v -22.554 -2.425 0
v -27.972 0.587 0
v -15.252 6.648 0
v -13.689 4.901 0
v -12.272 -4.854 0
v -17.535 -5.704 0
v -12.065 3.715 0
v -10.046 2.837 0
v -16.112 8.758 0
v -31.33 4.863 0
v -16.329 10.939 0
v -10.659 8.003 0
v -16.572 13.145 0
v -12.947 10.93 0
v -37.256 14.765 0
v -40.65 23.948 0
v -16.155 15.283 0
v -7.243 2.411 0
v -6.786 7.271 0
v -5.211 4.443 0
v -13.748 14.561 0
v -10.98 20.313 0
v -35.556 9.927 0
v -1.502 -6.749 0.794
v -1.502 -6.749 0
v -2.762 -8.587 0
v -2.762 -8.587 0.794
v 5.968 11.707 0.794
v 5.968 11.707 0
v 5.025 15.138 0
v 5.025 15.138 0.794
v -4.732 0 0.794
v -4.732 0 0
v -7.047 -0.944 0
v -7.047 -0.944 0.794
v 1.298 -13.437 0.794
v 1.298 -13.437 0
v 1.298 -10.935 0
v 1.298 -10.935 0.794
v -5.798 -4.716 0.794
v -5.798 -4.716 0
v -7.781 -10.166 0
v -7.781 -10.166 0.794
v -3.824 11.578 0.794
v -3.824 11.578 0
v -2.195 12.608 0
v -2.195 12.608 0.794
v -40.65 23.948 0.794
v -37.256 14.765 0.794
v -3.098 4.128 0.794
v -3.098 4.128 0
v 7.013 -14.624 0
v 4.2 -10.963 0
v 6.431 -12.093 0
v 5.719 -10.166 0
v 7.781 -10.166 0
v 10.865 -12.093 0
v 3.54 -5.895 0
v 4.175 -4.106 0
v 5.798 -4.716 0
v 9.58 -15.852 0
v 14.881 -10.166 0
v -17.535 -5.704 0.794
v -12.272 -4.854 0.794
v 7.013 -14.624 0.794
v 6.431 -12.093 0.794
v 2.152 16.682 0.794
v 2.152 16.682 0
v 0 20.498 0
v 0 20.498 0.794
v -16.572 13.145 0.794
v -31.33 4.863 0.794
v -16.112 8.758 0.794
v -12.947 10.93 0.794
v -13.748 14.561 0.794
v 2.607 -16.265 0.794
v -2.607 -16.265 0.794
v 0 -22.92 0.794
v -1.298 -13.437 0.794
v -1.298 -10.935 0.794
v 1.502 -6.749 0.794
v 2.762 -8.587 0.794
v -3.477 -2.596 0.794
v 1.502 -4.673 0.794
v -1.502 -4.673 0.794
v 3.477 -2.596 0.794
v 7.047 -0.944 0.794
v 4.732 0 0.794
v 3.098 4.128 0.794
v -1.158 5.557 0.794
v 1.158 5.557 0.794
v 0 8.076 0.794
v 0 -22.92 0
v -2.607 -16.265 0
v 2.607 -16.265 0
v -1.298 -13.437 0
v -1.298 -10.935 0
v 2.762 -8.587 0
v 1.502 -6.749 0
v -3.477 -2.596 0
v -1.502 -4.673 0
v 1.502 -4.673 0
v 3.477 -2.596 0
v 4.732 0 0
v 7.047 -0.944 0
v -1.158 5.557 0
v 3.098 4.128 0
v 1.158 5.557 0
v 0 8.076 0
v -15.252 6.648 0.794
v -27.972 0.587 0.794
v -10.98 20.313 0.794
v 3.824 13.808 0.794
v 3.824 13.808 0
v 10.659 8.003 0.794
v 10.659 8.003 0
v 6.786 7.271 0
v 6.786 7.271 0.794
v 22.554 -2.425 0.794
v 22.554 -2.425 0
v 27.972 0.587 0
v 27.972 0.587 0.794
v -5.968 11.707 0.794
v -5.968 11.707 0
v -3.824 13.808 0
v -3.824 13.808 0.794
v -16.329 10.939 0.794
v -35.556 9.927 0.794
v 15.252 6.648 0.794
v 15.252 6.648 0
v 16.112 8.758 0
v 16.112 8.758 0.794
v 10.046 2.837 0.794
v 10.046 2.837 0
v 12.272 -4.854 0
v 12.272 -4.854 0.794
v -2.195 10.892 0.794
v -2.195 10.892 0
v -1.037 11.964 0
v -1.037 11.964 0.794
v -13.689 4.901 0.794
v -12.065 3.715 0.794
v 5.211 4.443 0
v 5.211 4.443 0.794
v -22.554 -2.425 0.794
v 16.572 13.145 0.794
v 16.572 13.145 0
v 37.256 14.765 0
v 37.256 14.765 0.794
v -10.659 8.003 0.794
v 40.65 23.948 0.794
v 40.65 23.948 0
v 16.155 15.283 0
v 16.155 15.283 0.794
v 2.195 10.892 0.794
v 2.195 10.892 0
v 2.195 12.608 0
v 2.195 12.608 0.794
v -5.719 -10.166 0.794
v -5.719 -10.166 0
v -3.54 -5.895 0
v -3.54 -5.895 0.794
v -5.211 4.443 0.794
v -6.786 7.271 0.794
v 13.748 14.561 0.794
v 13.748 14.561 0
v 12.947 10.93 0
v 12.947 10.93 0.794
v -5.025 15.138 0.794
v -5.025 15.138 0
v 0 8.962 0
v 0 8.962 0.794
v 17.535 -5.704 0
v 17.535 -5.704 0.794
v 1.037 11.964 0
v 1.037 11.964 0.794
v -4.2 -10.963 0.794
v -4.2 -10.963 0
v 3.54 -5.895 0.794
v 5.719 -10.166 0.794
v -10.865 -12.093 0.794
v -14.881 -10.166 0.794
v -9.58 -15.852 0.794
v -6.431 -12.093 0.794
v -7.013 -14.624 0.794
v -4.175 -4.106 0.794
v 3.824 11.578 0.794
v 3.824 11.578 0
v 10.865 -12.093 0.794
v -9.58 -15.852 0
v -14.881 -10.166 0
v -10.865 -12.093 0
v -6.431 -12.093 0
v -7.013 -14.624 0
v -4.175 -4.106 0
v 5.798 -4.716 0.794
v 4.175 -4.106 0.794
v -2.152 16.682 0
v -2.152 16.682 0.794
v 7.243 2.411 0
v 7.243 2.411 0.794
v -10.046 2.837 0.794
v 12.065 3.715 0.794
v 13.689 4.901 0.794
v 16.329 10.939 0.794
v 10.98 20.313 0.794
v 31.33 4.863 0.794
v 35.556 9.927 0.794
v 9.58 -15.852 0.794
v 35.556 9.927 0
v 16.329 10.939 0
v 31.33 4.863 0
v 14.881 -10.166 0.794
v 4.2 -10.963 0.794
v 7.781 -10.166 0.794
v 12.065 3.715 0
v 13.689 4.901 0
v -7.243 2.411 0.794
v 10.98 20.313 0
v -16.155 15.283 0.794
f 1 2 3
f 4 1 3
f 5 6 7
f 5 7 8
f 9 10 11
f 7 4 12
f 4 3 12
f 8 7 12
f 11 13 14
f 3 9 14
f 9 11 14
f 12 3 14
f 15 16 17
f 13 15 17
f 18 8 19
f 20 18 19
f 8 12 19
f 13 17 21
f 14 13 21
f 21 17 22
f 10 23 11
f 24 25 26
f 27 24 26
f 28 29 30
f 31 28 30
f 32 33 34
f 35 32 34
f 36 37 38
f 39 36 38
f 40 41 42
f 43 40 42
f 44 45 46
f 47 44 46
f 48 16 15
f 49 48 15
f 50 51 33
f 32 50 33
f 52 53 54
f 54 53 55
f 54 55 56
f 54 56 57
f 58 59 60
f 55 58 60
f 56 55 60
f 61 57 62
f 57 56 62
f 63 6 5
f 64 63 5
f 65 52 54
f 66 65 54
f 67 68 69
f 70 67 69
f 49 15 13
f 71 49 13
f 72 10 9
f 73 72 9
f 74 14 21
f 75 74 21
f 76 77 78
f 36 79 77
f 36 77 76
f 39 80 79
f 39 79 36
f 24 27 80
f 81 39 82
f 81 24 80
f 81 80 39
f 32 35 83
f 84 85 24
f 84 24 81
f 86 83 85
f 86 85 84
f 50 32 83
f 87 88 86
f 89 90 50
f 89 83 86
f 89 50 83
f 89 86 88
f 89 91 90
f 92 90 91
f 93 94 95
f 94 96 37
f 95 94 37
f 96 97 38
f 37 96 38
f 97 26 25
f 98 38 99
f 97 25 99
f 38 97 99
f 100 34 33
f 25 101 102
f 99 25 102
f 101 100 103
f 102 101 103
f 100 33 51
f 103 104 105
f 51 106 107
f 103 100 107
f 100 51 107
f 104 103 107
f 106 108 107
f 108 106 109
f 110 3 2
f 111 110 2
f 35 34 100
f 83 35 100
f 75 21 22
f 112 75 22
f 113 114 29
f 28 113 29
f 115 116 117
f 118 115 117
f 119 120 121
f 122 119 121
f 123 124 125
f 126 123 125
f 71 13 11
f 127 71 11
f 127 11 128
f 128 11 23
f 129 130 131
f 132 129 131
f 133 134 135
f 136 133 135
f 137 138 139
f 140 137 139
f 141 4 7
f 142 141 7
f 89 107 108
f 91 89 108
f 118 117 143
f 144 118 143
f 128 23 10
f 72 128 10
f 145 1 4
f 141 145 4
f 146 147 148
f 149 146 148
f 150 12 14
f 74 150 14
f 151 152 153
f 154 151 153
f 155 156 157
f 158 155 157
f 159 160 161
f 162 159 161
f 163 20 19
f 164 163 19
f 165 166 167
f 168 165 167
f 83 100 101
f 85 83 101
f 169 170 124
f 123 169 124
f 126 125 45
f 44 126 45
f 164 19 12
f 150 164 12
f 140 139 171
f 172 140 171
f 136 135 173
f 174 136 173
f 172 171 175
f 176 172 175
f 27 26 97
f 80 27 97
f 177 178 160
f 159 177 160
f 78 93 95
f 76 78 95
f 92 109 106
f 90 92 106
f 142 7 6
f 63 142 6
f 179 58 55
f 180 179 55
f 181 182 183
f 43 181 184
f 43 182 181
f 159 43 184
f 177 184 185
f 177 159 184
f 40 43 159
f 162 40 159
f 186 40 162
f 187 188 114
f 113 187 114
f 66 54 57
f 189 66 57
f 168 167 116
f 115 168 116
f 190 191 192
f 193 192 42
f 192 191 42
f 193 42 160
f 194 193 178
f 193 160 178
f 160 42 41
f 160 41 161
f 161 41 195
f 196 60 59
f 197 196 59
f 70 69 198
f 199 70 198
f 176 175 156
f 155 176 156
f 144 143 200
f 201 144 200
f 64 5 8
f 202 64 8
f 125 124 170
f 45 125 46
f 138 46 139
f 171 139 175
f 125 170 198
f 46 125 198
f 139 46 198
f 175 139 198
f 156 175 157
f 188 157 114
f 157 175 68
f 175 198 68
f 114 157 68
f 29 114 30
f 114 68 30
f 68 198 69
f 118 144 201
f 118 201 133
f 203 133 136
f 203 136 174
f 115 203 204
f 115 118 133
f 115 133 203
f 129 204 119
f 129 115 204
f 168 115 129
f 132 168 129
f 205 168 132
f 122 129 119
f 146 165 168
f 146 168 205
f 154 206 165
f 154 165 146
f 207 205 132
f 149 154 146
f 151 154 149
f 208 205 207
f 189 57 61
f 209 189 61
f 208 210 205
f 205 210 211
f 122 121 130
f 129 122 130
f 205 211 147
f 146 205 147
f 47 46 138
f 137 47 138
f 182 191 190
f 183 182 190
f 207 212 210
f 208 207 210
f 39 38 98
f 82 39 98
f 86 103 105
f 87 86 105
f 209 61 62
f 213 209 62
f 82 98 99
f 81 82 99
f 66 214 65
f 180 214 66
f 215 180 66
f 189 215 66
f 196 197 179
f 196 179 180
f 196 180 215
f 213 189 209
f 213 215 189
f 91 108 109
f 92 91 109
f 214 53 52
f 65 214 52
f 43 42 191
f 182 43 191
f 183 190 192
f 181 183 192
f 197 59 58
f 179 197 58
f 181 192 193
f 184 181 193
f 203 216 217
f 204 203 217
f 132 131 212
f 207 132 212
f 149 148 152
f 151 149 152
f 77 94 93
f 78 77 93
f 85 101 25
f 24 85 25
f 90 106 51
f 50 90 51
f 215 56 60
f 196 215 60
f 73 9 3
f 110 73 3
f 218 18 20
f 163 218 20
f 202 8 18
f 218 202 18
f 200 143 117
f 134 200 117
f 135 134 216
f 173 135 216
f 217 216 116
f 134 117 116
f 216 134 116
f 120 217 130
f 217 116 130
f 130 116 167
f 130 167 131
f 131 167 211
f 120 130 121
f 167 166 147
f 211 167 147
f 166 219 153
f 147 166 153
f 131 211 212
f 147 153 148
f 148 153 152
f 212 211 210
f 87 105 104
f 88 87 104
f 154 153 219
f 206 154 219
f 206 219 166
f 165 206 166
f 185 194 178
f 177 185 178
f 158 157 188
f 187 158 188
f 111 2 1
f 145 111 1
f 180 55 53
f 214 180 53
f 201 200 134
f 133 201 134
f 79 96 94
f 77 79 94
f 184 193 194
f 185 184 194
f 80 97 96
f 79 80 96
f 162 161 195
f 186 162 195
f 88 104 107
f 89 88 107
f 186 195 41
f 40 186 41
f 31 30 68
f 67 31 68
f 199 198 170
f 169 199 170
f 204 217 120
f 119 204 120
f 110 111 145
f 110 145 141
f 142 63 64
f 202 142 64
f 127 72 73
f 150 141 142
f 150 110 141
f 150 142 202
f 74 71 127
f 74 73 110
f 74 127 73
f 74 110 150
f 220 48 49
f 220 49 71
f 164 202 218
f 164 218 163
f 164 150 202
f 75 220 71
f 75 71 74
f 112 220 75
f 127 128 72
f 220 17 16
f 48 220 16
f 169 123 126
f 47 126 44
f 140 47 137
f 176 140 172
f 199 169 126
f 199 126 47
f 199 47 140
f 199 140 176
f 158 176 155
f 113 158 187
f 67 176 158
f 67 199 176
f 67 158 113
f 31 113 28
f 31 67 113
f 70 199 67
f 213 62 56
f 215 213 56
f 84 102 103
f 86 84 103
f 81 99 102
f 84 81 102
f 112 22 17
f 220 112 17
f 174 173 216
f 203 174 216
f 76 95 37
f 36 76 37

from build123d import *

# Parameters (mm, degrees)
F1_DEPTH = 0.79375


with BuildPart() as f1:
    # F0 (on Top) → F1 (new body)
    with BuildSketch(Plane.XY):
        Polygon((2.151705, 16.681533), (0, 20.498225), (-2.151705, 16.681533), (-5.024946, 15.137702), (-5.968398, 11.706967), (-3.824189, 13.808292), (-3.824189, 11.578314), (-2.194589, 12.607534), (-2.194589, 10.892167), (-1.036716, 11.964272), (0, 8.962379), (1.036716, 11.964272), (2.194589, 10.892167), (2.194589, 12.607534), (3.824189, 11.578314), (3.824189, 13.808292), (5.968398, 11.706967), (5.024946, 15.137702), align=None)
        Polygon((1.158175, 5.55735), (0, 8.076103), (-1.158175, 5.55735), (-3.098295, 4.127788), (-4.732081, 0), (-7.046611, -0.943755), (-3.476582, -2.596304), (-1.502424, -4.672573), (-1.502424, -6.748843), (-2.7618, -8.586852), (-1.298201, -10.935418), (-1.298201, -13.436744), (-2.607217, -16.264636), (0, -22.920493), (2.607217, -16.264636), (1.298201, -13.436744), (1.298201, -10.935418), (2.7618, -8.586852), (1.502424, -6.748843), (1.502424, -4.672573), (3.476582, -2.596304), (7.046611, -0.943755), (4.732081, 0), (3.098295, 4.127788), align=None)
        Polygon((-5.798376, -4.716278), (-7.780868, -10.165637), (-14.88078, -10.165637), (-9.579851, -15.852088), (-10.864925, -12.093248), (-6.431421, -12.093248), (-7.013198, -14.623501), (-4.199942, -10.962648), (-5.718788, -10.165637), (-3.54007, -5.894522), (-4.174995, -4.105965), align=None)
        Polygon((-10.658663, 8.003411), (-12.947127, 10.929634), (-13.747742, 14.561193), (-10.97993, 20.313431), (-16.154537, 15.283232), (-40.649548, 23.948327), (-37.255723, 14.764503), (-16.571833, 13.145411), (-16.328968, 10.939399), (-35.555679, 9.927467), (-31.330302, 4.86337), (-16.112491, 8.757975), (-15.252227, 6.648204), (-27.971571, 0.586666), (-22.553699, -2.425472), (-13.689173, 4.900917), (-12.0646, 3.715415), (-17.534515, -5.704132), (-12.272468, -4.854108), (-10.046218, 2.836575), (-7.243132, 2.411495), (-5.211444, 4.443184), (-6.785735, 7.271308), align=None)
        Polygon((7.780868, -10.165637), (5.798376, -4.716278), (4.174995, -4.105965), (3.54007, -5.894522), (5.718788, -10.165637), (4.199942, -10.962648), (7.013198, -14.623501), (6.431421, -12.093248), (10.864925, -12.093248), (9.579851, -15.852088), (14.88078, -10.165637), align=None)
        Polygon((12.0646, 3.715415), (13.689173, 4.900917), (22.553699, -2.425472), (27.971571, 0.586666), (15.252227, 6.648204), (16.112491, 8.757975), (31.330302, 4.86337), (35.555679, 9.927467), (16.328968, 10.939399), (16.571833, 13.145411), (37.255723, 14.764503), (40.649548, 23.948327), (16.154537, 15.283232), (10.97993, 20.313431), (13.747742, 14.561193), (12.947127, 10.929634), (10.658663, 8.003411), (6.785735, 7.271308), (5.211444, 4.443184), (7.243132, 2.411495), (10.046218, 2.836575), (12.272468, -4.854108), (17.534515, -5.704132), align=None)
    extrude(amount=F1_DEPTH)


solid = f1.part
